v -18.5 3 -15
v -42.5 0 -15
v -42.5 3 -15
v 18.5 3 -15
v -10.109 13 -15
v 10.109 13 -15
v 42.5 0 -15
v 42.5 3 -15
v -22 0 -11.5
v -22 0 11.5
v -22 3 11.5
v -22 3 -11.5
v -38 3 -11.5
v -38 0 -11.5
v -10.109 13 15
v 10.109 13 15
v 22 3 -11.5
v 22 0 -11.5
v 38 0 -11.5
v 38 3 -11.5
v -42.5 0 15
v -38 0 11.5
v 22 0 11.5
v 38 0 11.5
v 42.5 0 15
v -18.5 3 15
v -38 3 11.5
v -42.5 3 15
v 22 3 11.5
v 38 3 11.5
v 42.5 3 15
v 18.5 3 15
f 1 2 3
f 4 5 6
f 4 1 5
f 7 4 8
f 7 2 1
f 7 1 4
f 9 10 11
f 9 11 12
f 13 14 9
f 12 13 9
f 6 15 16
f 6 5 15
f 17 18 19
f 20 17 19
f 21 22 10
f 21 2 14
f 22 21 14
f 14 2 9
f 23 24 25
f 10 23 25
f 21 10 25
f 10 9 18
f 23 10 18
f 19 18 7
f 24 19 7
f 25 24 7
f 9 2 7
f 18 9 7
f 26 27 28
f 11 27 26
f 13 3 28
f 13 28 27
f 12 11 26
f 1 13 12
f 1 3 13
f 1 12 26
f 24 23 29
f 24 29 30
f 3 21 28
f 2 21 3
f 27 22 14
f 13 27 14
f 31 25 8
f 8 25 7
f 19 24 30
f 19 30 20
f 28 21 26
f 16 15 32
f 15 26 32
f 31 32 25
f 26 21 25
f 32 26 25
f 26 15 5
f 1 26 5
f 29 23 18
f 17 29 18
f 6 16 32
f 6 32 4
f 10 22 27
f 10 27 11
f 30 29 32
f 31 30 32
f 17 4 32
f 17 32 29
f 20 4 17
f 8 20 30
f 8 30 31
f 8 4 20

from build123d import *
from OCP.BRepFilletAPI import BRepFilletAPI_MakeChamfer

# Parameters (mm, degrees)
CROQUIS1_W              = 85
CROQUIS1_H              = 30
CROQUIS1_W_2            = 16
CROQUIS1_H_2            = 23
SALIENTE_EXTRUIR1_DEPTH = 3
CROQUIS3_W              = 37
CROQUIS3_H              = 30
SALIENTE_EXTRUIR2_DEPTH = 10
CHAFL_N1_SIZE           = 10
CHAFL_N1_SIZE_2         = 8.390996312


with BuildPart() as part:
    # Croquis1 → Saliente-Extruir1 (new body)
    with BuildSketch(Plane(origin=(0, 0, 0), x_dir=(1, 0, 0), z_dir=(0, 1, 0))):
        Rectangle(CROQUIS1_W, CROQUIS1_H)
        with Locations((30, 0)):
            Rectangle(CROQUIS1_W_2, CROQUIS1_H_2, mode=Mode.SUBTRACT)
        with Locations((-30, 0)):
            Rectangle(CROQUIS1_W_2, CROQUIS1_H_2, mode=Mode.SUBTRACT)
    extrude(amount=SALIENTE_EXTRUIR1_DEPTH)

    # Croquis3 → Saliente-Extruir2 (add)
    with BuildSketch(Plane(origin=(0, 3, 0), x_dir=(1, 0, 0), z_dir=(0, 1, 0))):
        Rectangle(CROQUIS3_W, CROQUIS3_H)
    extrude(amount=SALIENTE_EXTRUIR2_DEPTH)

    # Chaflán1
    chafl_n1_edges_1 = [part.edges().sort_by_distance(p)[0] for p in [
        (18.5, 13, 0),
    ]]
    chafl_n1_side_1 = [part.faces().sort_by_distance(p)[0] for p in [
        (18.5, 12.832180074, 0),
    ]]
    chafl_n1_edges_2 = [part.edges().sort_by_distance(p)[0] for p in [
        (-18.5, 13, 0),
    ]]
    chafl_n1_side_2 = [part.faces().sort_by_distance(p)[0] for p in [
        (-18.5, 12.832180074, 0),
    ]]
    chafl_n1 = BRepFilletAPI_MakeChamfer(part.part.solid().wrapped)
    for e in chafl_n1_edges_1:
        chafl_n1.Add(CHAFL_N1_SIZE - 0.0001, CHAFL_N1_SIZE_2 - 0.0001, e.wrapped, chafl_n1_side_1[0].wrapped)
    for e in chafl_n1_edges_2:
        chafl_n1.Add(CHAFL_N1_SIZE - 0.0001, CHAFL_N1_SIZE_2 - 0.0001, e.wrapped, chafl_n1_side_2[0].wrapped)
    add(Compound.cast(chafl_n1.Shape()), mode=Mode.REPLACE)  # a hair under: the kernel refuses the full size


solid = part.part
